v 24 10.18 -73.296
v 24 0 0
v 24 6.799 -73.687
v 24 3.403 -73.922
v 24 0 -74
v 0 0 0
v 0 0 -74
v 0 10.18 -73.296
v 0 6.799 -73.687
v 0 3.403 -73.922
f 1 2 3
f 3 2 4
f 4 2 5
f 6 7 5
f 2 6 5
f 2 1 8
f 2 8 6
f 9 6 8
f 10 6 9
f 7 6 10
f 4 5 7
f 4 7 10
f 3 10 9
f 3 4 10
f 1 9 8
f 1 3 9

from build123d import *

# Parameters (mm, degrees)
CROQUIS1_W              = 24
CROQUIS1_H              = 144
SALIENTE_EXTRUIR1_DEPTH = 20
CORTAR_EXTRUIR2_DEPTH   = 148.349923651
CROQUIS4_W              = 24
CROQUIS4_H              = 70


with BuildPart() as part:
    # Croquis1 → Saliente-Extruir1 (new body)
    with BuildSketch(Plane(origin=(0, 0, 0), x_dir=(1, 0, 0), z_dir=(0, 1, 0))):
        with Locations((12, 72)):
            Rectangle(CROQUIS1_W, CROQUIS1_H)
    extrude(amount=SALIENTE_EXTRUIR1_DEPTH)

    # Croquis3 → Cortar-Extruir2 (cut, through all)
    with BuildSketch(Plane(origin=(24, 0, 0), x_dir=(0, 0, -1), z_dir=(1, 0, 0))):
        Polygon((144, 20), (0, 0), (0, 20), align=None)
    extrude(amount=-CORTAR_EXTRUIR2_DEPTH, mode=Mode.SUBTRACT)

    # Croquis4 → Cortar-Revolución2 (revolve, cut)
    with BuildSketch(Plane.XZ):
        with Locations((12, -109)):
            Rectangle(CROQUIS4_W, CROQUIS4_H)
    revolve(axis=Axis((0, 0, 0), (1, 0, 0)), mode=Mode.SUBTRACT)


with BuildPart() as body_2:
    # of the pieces the cut leaves, the one that is kept (cortar_revoluci_n2_keep)
    add(part.part.solids().sort_by_distance((0, 0, -74))[0])


solid = body_2.part
